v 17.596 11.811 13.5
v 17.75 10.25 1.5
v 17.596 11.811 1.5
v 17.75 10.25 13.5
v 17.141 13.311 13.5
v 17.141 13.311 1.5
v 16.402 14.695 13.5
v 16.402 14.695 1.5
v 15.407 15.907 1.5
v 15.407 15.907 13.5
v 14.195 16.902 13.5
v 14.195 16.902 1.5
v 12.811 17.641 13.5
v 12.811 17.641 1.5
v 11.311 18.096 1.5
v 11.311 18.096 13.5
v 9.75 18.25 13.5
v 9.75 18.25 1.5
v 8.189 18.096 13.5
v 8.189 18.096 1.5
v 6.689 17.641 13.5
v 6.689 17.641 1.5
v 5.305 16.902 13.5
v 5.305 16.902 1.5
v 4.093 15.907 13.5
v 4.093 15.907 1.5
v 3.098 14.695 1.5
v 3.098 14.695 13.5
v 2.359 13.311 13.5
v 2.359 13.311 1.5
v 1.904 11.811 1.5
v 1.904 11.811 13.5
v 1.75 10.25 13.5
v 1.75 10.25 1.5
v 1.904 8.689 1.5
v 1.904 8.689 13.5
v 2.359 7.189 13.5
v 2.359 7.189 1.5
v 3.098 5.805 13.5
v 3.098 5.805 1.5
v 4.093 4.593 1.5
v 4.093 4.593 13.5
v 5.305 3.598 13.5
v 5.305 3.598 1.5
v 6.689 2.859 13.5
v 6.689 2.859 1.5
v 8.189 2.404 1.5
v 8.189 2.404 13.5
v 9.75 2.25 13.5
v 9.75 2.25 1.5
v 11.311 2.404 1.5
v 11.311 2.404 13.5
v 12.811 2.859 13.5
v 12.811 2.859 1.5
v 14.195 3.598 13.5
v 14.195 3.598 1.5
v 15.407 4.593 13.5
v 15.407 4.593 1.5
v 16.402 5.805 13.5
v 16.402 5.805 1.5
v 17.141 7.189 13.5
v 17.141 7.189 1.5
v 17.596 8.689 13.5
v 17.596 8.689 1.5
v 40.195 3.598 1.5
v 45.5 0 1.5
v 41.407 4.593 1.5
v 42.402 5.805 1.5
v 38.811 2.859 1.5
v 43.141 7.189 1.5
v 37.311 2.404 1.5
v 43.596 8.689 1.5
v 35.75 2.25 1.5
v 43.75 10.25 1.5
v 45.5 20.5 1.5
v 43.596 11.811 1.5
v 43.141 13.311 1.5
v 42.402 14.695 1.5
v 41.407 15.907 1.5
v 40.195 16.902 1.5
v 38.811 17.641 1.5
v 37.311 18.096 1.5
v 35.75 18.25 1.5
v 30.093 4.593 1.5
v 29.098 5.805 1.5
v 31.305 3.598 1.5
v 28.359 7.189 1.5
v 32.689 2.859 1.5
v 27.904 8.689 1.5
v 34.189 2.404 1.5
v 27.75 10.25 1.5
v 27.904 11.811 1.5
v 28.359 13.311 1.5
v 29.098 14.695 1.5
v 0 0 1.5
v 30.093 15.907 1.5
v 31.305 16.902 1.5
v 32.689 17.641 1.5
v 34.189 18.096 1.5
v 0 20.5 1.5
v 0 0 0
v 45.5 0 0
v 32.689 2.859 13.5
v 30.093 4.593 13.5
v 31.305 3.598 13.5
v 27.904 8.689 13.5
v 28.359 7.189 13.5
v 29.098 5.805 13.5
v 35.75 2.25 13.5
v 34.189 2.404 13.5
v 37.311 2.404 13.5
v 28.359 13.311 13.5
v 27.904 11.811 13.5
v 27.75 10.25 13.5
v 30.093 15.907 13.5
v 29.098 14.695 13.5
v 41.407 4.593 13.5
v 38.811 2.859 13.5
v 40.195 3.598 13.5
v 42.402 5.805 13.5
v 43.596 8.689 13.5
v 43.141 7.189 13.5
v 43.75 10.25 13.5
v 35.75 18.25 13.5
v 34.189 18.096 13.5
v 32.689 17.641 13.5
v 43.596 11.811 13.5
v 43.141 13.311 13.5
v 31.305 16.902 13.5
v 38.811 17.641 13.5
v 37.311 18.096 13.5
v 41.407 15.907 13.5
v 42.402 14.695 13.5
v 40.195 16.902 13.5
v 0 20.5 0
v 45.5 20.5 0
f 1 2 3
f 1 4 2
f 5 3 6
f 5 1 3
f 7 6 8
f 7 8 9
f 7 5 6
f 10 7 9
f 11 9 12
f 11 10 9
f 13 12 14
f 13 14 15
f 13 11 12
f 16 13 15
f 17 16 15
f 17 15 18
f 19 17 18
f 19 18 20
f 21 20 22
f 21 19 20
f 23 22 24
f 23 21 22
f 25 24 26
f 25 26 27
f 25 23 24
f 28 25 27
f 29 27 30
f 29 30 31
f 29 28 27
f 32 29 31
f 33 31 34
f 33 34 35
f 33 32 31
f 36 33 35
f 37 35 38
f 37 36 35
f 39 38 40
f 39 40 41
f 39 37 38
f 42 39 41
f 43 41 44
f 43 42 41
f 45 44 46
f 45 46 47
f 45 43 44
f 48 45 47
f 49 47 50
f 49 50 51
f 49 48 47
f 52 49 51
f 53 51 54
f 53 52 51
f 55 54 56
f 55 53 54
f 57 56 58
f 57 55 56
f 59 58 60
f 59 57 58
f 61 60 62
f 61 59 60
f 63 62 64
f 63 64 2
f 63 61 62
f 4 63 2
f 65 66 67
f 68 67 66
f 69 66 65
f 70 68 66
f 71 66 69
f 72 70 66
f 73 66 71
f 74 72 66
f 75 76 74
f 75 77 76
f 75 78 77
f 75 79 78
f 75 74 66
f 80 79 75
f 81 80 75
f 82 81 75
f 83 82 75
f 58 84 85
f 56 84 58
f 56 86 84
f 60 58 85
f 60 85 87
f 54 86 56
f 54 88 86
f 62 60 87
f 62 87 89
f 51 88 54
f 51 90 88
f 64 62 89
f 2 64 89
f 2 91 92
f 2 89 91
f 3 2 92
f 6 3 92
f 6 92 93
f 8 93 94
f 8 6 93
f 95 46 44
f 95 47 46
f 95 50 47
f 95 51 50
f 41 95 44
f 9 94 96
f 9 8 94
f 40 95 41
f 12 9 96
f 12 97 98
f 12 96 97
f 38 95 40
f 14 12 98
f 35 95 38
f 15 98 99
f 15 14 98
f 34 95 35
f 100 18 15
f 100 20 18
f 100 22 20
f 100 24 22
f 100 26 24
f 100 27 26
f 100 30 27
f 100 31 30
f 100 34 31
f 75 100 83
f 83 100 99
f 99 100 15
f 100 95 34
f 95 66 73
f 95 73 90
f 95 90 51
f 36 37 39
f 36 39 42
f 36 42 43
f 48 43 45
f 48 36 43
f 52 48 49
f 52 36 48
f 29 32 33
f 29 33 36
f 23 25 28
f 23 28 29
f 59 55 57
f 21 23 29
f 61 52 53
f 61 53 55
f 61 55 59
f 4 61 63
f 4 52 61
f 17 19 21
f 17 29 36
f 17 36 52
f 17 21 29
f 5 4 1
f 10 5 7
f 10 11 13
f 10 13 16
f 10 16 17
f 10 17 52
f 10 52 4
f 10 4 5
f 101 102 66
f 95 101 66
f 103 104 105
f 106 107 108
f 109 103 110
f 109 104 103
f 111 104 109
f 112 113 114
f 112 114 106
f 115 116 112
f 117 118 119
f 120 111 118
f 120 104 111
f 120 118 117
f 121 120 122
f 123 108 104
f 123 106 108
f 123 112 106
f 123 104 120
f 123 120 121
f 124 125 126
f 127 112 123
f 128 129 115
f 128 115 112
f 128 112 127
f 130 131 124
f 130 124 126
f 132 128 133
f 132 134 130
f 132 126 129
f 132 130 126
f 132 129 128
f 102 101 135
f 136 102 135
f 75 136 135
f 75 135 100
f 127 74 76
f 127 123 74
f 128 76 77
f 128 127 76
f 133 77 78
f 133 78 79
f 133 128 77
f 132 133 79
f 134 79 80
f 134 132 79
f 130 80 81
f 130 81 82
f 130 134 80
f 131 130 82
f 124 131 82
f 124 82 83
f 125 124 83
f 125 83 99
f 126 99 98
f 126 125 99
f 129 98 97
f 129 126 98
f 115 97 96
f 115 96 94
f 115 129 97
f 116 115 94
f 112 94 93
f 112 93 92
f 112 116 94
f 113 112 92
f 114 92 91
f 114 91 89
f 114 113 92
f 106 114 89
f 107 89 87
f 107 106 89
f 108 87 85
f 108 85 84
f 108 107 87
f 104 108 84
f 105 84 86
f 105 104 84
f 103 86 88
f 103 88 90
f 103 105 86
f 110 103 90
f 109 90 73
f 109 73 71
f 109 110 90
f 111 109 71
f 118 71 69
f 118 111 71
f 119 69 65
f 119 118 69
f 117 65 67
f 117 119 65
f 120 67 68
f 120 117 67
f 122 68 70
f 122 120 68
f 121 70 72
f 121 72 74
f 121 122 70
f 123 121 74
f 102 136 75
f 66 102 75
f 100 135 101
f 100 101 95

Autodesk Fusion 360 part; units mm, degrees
box "BoxPrimitive1" add length 20.5 width 45.5 height 1.5 placed x (0, 1, 0) y (-1, 0, 0) z (0, 0, 1) at (45.5, 0, 0)
sketch "Sketch2" plane through (0, 0, 1.5) normal (0, 0, 1) x (-1, 0, 0)
  line L0 (-45.5, -20.5) -> (0, -20.5)
  line L1 (0, -20.5) -> (0, 0)
  line L2 (0, 0) -> (-45.5, 0)
  line L3 (-45.5, 0) -> (-45.5, -20.5)
  line L4 (-45.5, -20.5) -> (-35.75, -20.5)
  line L5 (-35.75, -20.5) -> (-35.75, -10.25)
  line L6 (0, -20.5) -> (-9.75, -20.5)
  line L7 (-9.75, -20.5) -> (-9.75, -10.25)
  dimension "d6" = 9.75
  dimension "d7" = 10.25
  dimension "d10" = 9.75
  dimension "d11" = 10.25
cylinder "CylinderPrimitive1" add diameter 16 height 12 placed x (1, 0, 0) y (0, 1, 0) z (0, 0, 1) at (35.75, 10.25, 1.5)
cylinder "CylinderPrimitive2" add diameter 16 height 12 placed x (1, 0, 0) y (0, 1, 0) z (0, 0, 1) at (9.75, 10.25, 1.5)
